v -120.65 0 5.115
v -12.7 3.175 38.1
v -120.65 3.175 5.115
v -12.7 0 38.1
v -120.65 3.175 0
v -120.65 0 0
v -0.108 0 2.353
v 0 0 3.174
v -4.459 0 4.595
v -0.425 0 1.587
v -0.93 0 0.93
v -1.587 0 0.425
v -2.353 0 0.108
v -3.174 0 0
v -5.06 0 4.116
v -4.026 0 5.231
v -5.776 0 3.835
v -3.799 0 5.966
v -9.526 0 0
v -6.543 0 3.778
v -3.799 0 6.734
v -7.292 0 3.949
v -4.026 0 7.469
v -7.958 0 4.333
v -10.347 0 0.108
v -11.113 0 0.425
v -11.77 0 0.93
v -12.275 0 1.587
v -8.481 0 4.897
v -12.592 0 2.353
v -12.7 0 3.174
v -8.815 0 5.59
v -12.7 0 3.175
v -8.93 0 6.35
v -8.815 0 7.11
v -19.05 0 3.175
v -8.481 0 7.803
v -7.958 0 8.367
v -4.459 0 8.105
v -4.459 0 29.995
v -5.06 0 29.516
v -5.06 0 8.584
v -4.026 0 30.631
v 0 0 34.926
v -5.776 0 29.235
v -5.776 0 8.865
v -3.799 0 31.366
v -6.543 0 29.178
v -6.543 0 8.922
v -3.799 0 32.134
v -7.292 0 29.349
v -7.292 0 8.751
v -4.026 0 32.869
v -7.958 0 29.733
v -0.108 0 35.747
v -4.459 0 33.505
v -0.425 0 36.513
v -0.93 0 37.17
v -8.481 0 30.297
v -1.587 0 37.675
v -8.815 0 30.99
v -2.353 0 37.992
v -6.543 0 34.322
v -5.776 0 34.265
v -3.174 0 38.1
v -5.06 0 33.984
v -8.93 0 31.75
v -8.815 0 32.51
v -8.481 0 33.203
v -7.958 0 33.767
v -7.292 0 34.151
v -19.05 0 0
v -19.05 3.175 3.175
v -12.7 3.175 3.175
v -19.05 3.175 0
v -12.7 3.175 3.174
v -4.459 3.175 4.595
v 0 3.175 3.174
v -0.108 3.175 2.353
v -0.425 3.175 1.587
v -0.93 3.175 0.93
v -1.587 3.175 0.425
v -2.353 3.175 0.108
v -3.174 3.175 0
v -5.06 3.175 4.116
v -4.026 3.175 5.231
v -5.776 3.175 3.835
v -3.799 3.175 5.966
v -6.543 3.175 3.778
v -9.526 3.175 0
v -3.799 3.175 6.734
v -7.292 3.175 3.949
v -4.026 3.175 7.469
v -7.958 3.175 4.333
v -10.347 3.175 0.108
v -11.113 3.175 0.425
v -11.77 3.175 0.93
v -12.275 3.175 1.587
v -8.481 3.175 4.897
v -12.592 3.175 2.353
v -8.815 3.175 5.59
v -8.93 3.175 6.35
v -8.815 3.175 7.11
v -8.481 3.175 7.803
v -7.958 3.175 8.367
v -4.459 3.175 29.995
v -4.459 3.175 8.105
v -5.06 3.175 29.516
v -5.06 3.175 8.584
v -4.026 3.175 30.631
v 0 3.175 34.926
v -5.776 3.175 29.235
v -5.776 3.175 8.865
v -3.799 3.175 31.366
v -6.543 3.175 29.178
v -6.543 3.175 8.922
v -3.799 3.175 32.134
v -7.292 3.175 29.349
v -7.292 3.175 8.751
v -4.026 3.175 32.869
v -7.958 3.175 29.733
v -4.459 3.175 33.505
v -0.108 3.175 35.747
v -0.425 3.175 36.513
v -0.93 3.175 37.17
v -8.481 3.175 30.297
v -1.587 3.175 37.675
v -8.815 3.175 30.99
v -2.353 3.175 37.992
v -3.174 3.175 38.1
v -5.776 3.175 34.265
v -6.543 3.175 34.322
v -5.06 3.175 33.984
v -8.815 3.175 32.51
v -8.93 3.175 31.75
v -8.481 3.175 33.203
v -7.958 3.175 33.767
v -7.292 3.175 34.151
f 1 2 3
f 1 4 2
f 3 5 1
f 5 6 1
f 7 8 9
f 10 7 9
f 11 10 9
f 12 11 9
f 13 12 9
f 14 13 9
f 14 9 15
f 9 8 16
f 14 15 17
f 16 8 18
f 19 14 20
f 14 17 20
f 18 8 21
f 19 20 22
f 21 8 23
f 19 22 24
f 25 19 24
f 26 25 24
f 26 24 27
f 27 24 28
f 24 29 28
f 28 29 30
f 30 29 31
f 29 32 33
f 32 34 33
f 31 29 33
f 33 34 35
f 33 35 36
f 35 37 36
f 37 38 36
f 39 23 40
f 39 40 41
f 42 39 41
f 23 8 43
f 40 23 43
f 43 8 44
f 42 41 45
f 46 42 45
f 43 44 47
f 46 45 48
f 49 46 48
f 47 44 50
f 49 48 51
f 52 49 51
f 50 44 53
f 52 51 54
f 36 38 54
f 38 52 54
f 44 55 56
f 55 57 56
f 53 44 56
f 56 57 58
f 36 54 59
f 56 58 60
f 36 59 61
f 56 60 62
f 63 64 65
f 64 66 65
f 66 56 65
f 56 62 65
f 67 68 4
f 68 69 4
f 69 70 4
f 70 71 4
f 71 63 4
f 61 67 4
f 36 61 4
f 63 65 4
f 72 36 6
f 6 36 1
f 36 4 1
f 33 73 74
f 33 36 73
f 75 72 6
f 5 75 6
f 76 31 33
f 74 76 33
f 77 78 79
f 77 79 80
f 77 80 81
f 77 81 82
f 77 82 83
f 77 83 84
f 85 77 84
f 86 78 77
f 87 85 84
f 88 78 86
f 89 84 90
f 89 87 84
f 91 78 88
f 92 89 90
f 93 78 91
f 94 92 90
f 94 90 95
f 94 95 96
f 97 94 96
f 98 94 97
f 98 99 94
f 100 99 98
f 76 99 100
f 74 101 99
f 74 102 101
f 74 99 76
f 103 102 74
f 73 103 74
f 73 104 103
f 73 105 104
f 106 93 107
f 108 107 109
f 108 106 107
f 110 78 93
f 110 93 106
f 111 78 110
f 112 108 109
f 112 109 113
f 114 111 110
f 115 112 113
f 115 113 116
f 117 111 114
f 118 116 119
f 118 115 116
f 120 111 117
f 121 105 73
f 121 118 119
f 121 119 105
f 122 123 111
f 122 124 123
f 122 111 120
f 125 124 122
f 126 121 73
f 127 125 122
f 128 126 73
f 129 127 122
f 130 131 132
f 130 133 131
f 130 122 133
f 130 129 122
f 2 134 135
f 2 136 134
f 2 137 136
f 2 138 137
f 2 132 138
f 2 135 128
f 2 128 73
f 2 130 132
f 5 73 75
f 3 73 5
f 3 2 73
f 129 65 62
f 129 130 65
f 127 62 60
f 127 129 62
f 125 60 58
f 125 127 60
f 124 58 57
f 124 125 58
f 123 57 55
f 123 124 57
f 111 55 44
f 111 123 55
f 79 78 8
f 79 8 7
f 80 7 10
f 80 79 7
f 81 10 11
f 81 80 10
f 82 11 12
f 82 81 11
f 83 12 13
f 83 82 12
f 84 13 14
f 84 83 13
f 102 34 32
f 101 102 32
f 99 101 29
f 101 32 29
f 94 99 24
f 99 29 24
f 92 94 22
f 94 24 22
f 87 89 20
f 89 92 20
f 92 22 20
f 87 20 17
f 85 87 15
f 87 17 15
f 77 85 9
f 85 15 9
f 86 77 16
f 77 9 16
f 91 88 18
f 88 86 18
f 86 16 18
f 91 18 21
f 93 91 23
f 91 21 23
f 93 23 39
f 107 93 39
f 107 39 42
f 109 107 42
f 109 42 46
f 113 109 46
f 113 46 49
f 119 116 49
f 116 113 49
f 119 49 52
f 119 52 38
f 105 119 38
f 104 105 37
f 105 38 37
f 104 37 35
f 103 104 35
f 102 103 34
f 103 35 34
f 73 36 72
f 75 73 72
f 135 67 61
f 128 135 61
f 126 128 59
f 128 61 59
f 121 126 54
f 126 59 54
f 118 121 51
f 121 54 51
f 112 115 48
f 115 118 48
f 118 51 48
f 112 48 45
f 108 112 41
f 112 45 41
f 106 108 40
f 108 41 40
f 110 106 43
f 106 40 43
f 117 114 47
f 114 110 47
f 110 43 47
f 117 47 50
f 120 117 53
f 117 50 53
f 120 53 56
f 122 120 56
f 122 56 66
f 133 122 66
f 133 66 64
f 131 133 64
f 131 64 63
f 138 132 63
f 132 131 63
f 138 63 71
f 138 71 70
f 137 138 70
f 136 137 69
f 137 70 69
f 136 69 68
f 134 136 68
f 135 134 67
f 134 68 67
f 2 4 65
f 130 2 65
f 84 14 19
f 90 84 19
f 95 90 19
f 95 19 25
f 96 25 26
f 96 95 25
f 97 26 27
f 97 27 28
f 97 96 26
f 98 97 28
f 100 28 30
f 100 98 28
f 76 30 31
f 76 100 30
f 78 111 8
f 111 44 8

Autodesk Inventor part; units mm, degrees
ref_plane "YZ Plane" through (0, 0, 0) normal (1, 0, 0) x (0, 1, 0)
ref_plane "XZ Plane" through (0, 0, 0) normal (0, 1, 0) x (-1, 0, 0)
ref_plane "XY Plane" through (0, 0, 0) normal (0, 0, 1) x (1, 0, 0)
sketch "Sketch1" plane through (0, 0, 0) normal (0, 1, 0) x (-1, 0, 0)
  line L0 (0, 0) -> (12.7, 0)
  line L1 (12.7, 0) -> (12.7, 38.1)
  line L2 (12.7, 38.1) -> (0, 38.1)
  line L3 (0, 38.1) -> (0, 0)
  circle A0 centre (6.35, 31.75) radius 2.5797
  circle A1 centre (6.35, 6.35) radius 2.5797
  line L4 (0, 0) -> (127, 0)
  line L5 (127, 0) -> (127, 3.175)
  line L6 (127, 3.175) -> (0, 3.175)
  line L7 (0, 3.175) -> (0, 0)
  line L8 (12.7, 38.1) -> (127, 3.175)
  line L9 (0, 3.175) -> (127, 3.175)
  line L10 (127, 3.175) -> (127, 1.5875)
  line L11 (127, 1.5875) -> (0, 1.5875)
  line L12 (0, 1.5875) -> (0, 3.175)
  line L13 (0, 3.175) -> (19.05, 3.175)
  line L14 (19.05, 3.175) -> (19.05, 1.5875)
  line L15 (19.05, 1.5875) -> (0, 1.5875)
  line L16 (0, 1.5875) -> (0, 3.175)
  line L17 (127, 3.175) -> (120.65, 3.175)
  line L18 (120.65, 3.175) -> (120.65, 1.5875)
  line L19 (120.65, 1.5875) -> (127, 1.5875)
  line L20 (127, 1.5875) -> (127, 3.175)
  line L21 (120.65, 3.175) -> (120.65, 5.1153)
  line L22 (127, 0) -> (0, 0)
  line L23 (0, 0) -> (0, -12.7)
  line L24 (0, -12.7) -> (127, -12.7)
  line L25 (127, -12.7) -> (127, 0)
  line L26 (120.65, 1.5875) -> (120.65, 0)
  line L27 (19.05, 1.5875) -> (19.05, 0)
  point P0 (0, 3.175)
  point P1 (0, 1.5875)
  point P2 (120.65, 1.5875)
  point P3 (120.65, 3.175)
  point P4 (19.05, 3.175)
  point P5 (19.05, 1.5875)
  point P6 (120.65, 3.175)
  point P7 (12.7, 1.5875)
  point P8 (12.7, 3.175)
  dimension "d0" = 12.7
  dimension "d1" = 6.35
  dimension "d2" = 6.35
  dimension "d3" = 25.4
  dimension "d5" = 6.35
  dimension "d6" = 5.1594
  dimension "d7" = 127
  dimension "d8" = 3.175
  dimension "d9" = 127
  dimension "d10" = 1.5875
  dimension "d15" = 19.05
  dimension "d16" = 1.5875
  dimension "d17" = 6.35
  dimension "d18" = 1.5875
  dimension "d25" = 12.7
  dimension "d27" = 6.35
extrude "Extrusion1" add sketch "Sketch1" along normal blind 3.175 contours L3 L11 L1 L0 | L3 L6 L1 L11 | L3 L2 L1 L6 | L1 L8 L21 L6
extrude "Extrusion2" add sketch "Sketch1" along normal up to surface (3.175 mm away) contours L27 L11 L26 L4 | L14 L6 L18 L11
fillet "Fillet1" radius 3.175 3 edges at (-12.7, 1.5875, 0) (0, 1.5875, 0) (0, 1.5875, 38.1)
equation "\"d1\" = d5"
equation "\"d2\" = d21"
equation "\"d5\" = 0.5 * d0"
equation "\"d16\" = d18"
equation "\"d21\" = d5"
properties part number "Gripper triangle"
